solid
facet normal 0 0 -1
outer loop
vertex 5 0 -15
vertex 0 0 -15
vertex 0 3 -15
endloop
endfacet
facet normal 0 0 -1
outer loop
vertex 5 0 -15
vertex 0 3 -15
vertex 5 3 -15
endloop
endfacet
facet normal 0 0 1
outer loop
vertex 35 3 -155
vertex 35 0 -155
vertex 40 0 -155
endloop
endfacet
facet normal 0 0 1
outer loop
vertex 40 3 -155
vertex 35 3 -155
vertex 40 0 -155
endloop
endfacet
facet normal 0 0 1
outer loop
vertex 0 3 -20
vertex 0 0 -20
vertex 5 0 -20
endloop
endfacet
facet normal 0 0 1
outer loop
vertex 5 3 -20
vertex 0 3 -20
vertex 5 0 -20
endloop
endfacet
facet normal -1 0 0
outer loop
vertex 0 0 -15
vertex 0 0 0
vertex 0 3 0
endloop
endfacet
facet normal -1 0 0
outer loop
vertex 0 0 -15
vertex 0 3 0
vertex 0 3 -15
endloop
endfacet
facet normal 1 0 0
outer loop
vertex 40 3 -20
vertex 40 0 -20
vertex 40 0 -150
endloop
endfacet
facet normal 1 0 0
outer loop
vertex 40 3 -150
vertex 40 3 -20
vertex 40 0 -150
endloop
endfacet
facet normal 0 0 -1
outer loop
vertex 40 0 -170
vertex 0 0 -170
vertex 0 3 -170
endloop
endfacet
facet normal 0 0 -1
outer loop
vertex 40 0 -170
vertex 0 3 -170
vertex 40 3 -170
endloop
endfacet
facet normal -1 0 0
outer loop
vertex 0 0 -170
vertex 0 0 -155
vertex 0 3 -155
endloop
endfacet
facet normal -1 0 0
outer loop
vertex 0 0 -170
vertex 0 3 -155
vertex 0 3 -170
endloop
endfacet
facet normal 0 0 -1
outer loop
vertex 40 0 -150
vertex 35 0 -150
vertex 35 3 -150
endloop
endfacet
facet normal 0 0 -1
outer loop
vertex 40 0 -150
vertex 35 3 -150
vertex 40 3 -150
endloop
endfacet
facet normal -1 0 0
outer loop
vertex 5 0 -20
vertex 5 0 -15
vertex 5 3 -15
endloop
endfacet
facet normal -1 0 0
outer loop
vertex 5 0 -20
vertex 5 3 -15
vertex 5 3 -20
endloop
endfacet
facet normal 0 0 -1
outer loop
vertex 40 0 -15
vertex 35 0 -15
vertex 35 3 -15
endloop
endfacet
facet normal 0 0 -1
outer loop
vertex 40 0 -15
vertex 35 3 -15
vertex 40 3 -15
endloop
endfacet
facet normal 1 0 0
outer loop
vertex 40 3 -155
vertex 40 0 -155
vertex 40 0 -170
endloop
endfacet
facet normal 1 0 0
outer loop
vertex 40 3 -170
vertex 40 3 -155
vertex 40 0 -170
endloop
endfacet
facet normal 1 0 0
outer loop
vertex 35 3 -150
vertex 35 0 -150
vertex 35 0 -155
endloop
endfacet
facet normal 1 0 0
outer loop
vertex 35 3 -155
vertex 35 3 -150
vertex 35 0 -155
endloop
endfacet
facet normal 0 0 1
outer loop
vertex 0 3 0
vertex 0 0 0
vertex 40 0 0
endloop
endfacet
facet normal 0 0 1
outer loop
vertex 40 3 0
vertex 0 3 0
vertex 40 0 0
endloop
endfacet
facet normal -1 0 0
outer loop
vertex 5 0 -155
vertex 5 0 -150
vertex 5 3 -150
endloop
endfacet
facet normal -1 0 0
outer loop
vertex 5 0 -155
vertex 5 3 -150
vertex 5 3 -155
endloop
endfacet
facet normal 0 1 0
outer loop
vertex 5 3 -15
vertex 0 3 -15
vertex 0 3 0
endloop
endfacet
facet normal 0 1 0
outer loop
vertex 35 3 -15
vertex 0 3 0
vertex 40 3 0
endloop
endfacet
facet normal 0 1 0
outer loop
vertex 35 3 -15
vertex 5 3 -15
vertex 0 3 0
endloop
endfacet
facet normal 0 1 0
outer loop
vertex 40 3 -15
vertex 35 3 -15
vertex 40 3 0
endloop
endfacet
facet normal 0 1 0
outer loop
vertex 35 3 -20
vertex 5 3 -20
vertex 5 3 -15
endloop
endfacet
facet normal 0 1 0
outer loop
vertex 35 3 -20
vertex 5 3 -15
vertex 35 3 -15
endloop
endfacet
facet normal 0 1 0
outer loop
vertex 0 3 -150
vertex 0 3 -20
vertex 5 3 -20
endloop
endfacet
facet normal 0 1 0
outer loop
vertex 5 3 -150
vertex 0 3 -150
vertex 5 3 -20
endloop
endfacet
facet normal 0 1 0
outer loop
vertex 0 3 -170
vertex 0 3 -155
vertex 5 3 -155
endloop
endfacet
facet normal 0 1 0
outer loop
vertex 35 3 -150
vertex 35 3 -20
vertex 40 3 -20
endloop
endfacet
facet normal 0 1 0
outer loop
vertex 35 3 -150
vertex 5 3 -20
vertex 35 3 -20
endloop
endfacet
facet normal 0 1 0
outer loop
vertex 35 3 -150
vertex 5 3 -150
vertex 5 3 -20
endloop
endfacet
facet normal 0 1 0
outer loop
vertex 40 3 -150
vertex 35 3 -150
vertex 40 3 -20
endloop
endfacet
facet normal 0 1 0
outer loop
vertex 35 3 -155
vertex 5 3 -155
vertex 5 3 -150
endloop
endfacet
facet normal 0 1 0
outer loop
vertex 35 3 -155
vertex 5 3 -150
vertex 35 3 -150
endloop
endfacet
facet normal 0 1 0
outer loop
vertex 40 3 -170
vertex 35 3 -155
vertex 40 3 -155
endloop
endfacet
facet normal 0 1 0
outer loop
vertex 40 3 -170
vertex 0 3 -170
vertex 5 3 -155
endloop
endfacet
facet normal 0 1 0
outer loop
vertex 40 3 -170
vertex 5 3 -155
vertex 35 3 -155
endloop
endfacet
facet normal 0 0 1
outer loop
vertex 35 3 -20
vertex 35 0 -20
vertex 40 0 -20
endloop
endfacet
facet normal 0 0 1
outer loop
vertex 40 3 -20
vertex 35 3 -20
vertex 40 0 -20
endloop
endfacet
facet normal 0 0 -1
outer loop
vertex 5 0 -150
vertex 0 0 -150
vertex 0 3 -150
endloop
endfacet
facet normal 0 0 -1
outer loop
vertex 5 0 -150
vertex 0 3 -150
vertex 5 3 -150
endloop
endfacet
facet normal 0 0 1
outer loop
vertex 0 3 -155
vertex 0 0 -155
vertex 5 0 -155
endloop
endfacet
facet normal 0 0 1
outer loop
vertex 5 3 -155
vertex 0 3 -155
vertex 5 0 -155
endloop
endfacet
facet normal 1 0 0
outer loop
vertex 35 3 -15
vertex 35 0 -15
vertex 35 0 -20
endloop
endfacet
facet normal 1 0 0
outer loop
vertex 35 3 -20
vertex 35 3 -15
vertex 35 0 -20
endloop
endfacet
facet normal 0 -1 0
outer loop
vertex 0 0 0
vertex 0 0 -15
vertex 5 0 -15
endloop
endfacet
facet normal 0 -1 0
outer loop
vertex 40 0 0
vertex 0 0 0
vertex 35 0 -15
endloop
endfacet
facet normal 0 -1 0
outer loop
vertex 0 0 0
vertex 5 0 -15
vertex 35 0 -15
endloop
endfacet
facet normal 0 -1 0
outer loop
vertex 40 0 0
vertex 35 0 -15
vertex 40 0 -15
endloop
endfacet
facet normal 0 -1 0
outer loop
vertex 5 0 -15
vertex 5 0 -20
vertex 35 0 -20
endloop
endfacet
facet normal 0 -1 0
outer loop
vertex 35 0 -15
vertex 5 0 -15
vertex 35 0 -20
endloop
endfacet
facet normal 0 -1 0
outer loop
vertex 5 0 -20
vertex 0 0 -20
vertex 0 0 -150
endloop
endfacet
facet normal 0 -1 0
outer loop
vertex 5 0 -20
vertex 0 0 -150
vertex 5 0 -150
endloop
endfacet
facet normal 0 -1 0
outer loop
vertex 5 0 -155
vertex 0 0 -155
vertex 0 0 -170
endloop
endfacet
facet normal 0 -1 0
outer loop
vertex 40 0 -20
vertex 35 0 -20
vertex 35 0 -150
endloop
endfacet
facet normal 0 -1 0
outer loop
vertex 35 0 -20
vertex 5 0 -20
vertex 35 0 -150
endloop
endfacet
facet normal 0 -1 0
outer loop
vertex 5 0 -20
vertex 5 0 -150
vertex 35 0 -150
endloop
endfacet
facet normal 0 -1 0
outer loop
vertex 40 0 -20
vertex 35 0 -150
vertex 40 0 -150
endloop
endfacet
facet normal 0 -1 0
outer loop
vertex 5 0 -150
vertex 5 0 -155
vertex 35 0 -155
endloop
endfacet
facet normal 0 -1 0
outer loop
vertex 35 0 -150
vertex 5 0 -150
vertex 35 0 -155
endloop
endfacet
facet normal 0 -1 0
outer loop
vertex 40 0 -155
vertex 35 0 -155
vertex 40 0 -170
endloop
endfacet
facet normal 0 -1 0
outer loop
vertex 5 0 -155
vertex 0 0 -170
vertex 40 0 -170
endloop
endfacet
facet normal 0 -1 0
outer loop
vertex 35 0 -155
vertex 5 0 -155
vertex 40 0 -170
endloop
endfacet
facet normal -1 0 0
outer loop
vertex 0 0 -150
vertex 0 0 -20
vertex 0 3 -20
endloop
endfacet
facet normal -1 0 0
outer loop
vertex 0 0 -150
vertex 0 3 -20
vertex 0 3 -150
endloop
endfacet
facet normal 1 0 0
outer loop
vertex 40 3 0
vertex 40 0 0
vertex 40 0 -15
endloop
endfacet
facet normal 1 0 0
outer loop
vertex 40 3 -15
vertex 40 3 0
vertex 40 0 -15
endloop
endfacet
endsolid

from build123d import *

# Parameters (mm, degrees)
SKETCH1_W           = 40
SKETCH1_H           = 170
BOSS_EXTRUDE1_DEPTH = 3
SKETCH2_W           = 5
SKETCH2_H           = 5
CUT_EXTRUDE1_DEPTH  = 10


with BuildPart() as part:
    # Sketch1 → Boss-Extrude1 (new body)
    with BuildSketch(Plane(origin=(0, 0, 0), x_dir=(1, 0, 0), z_dir=(0, 1, 0))):
        with Locations((20, 85)):
            Rectangle(SKETCH1_W, SKETCH1_H)
    extrude(amount=BOSS_EXTRUDE1_DEPTH)

    # Sketch2 → Cut-Extrude1 (cut)
    with BuildSketch(Plane(origin=(0, 0, 0), x_dir=(1, 0, 0), z_dir=(0, 1, 0))):
        with Locations((2.5, 152.5)):
            Rectangle(SKETCH2_W, SKETCH2_H)
        with Locations((37.5, 17.5)):
            Rectangle(SKETCH2_W, SKETCH2_H)
        with Locations((2.5, 17.5)):
            Rectangle(SKETCH2_W, SKETCH2_H)
        with Locations((37.5, 152.5)):
            Rectangle(SKETCH2_W, SKETCH2_H)
    extrude(amount=CUT_EXTRUDE1_DEPTH, mode=Mode.SUBTRACT)


solid = part.part
